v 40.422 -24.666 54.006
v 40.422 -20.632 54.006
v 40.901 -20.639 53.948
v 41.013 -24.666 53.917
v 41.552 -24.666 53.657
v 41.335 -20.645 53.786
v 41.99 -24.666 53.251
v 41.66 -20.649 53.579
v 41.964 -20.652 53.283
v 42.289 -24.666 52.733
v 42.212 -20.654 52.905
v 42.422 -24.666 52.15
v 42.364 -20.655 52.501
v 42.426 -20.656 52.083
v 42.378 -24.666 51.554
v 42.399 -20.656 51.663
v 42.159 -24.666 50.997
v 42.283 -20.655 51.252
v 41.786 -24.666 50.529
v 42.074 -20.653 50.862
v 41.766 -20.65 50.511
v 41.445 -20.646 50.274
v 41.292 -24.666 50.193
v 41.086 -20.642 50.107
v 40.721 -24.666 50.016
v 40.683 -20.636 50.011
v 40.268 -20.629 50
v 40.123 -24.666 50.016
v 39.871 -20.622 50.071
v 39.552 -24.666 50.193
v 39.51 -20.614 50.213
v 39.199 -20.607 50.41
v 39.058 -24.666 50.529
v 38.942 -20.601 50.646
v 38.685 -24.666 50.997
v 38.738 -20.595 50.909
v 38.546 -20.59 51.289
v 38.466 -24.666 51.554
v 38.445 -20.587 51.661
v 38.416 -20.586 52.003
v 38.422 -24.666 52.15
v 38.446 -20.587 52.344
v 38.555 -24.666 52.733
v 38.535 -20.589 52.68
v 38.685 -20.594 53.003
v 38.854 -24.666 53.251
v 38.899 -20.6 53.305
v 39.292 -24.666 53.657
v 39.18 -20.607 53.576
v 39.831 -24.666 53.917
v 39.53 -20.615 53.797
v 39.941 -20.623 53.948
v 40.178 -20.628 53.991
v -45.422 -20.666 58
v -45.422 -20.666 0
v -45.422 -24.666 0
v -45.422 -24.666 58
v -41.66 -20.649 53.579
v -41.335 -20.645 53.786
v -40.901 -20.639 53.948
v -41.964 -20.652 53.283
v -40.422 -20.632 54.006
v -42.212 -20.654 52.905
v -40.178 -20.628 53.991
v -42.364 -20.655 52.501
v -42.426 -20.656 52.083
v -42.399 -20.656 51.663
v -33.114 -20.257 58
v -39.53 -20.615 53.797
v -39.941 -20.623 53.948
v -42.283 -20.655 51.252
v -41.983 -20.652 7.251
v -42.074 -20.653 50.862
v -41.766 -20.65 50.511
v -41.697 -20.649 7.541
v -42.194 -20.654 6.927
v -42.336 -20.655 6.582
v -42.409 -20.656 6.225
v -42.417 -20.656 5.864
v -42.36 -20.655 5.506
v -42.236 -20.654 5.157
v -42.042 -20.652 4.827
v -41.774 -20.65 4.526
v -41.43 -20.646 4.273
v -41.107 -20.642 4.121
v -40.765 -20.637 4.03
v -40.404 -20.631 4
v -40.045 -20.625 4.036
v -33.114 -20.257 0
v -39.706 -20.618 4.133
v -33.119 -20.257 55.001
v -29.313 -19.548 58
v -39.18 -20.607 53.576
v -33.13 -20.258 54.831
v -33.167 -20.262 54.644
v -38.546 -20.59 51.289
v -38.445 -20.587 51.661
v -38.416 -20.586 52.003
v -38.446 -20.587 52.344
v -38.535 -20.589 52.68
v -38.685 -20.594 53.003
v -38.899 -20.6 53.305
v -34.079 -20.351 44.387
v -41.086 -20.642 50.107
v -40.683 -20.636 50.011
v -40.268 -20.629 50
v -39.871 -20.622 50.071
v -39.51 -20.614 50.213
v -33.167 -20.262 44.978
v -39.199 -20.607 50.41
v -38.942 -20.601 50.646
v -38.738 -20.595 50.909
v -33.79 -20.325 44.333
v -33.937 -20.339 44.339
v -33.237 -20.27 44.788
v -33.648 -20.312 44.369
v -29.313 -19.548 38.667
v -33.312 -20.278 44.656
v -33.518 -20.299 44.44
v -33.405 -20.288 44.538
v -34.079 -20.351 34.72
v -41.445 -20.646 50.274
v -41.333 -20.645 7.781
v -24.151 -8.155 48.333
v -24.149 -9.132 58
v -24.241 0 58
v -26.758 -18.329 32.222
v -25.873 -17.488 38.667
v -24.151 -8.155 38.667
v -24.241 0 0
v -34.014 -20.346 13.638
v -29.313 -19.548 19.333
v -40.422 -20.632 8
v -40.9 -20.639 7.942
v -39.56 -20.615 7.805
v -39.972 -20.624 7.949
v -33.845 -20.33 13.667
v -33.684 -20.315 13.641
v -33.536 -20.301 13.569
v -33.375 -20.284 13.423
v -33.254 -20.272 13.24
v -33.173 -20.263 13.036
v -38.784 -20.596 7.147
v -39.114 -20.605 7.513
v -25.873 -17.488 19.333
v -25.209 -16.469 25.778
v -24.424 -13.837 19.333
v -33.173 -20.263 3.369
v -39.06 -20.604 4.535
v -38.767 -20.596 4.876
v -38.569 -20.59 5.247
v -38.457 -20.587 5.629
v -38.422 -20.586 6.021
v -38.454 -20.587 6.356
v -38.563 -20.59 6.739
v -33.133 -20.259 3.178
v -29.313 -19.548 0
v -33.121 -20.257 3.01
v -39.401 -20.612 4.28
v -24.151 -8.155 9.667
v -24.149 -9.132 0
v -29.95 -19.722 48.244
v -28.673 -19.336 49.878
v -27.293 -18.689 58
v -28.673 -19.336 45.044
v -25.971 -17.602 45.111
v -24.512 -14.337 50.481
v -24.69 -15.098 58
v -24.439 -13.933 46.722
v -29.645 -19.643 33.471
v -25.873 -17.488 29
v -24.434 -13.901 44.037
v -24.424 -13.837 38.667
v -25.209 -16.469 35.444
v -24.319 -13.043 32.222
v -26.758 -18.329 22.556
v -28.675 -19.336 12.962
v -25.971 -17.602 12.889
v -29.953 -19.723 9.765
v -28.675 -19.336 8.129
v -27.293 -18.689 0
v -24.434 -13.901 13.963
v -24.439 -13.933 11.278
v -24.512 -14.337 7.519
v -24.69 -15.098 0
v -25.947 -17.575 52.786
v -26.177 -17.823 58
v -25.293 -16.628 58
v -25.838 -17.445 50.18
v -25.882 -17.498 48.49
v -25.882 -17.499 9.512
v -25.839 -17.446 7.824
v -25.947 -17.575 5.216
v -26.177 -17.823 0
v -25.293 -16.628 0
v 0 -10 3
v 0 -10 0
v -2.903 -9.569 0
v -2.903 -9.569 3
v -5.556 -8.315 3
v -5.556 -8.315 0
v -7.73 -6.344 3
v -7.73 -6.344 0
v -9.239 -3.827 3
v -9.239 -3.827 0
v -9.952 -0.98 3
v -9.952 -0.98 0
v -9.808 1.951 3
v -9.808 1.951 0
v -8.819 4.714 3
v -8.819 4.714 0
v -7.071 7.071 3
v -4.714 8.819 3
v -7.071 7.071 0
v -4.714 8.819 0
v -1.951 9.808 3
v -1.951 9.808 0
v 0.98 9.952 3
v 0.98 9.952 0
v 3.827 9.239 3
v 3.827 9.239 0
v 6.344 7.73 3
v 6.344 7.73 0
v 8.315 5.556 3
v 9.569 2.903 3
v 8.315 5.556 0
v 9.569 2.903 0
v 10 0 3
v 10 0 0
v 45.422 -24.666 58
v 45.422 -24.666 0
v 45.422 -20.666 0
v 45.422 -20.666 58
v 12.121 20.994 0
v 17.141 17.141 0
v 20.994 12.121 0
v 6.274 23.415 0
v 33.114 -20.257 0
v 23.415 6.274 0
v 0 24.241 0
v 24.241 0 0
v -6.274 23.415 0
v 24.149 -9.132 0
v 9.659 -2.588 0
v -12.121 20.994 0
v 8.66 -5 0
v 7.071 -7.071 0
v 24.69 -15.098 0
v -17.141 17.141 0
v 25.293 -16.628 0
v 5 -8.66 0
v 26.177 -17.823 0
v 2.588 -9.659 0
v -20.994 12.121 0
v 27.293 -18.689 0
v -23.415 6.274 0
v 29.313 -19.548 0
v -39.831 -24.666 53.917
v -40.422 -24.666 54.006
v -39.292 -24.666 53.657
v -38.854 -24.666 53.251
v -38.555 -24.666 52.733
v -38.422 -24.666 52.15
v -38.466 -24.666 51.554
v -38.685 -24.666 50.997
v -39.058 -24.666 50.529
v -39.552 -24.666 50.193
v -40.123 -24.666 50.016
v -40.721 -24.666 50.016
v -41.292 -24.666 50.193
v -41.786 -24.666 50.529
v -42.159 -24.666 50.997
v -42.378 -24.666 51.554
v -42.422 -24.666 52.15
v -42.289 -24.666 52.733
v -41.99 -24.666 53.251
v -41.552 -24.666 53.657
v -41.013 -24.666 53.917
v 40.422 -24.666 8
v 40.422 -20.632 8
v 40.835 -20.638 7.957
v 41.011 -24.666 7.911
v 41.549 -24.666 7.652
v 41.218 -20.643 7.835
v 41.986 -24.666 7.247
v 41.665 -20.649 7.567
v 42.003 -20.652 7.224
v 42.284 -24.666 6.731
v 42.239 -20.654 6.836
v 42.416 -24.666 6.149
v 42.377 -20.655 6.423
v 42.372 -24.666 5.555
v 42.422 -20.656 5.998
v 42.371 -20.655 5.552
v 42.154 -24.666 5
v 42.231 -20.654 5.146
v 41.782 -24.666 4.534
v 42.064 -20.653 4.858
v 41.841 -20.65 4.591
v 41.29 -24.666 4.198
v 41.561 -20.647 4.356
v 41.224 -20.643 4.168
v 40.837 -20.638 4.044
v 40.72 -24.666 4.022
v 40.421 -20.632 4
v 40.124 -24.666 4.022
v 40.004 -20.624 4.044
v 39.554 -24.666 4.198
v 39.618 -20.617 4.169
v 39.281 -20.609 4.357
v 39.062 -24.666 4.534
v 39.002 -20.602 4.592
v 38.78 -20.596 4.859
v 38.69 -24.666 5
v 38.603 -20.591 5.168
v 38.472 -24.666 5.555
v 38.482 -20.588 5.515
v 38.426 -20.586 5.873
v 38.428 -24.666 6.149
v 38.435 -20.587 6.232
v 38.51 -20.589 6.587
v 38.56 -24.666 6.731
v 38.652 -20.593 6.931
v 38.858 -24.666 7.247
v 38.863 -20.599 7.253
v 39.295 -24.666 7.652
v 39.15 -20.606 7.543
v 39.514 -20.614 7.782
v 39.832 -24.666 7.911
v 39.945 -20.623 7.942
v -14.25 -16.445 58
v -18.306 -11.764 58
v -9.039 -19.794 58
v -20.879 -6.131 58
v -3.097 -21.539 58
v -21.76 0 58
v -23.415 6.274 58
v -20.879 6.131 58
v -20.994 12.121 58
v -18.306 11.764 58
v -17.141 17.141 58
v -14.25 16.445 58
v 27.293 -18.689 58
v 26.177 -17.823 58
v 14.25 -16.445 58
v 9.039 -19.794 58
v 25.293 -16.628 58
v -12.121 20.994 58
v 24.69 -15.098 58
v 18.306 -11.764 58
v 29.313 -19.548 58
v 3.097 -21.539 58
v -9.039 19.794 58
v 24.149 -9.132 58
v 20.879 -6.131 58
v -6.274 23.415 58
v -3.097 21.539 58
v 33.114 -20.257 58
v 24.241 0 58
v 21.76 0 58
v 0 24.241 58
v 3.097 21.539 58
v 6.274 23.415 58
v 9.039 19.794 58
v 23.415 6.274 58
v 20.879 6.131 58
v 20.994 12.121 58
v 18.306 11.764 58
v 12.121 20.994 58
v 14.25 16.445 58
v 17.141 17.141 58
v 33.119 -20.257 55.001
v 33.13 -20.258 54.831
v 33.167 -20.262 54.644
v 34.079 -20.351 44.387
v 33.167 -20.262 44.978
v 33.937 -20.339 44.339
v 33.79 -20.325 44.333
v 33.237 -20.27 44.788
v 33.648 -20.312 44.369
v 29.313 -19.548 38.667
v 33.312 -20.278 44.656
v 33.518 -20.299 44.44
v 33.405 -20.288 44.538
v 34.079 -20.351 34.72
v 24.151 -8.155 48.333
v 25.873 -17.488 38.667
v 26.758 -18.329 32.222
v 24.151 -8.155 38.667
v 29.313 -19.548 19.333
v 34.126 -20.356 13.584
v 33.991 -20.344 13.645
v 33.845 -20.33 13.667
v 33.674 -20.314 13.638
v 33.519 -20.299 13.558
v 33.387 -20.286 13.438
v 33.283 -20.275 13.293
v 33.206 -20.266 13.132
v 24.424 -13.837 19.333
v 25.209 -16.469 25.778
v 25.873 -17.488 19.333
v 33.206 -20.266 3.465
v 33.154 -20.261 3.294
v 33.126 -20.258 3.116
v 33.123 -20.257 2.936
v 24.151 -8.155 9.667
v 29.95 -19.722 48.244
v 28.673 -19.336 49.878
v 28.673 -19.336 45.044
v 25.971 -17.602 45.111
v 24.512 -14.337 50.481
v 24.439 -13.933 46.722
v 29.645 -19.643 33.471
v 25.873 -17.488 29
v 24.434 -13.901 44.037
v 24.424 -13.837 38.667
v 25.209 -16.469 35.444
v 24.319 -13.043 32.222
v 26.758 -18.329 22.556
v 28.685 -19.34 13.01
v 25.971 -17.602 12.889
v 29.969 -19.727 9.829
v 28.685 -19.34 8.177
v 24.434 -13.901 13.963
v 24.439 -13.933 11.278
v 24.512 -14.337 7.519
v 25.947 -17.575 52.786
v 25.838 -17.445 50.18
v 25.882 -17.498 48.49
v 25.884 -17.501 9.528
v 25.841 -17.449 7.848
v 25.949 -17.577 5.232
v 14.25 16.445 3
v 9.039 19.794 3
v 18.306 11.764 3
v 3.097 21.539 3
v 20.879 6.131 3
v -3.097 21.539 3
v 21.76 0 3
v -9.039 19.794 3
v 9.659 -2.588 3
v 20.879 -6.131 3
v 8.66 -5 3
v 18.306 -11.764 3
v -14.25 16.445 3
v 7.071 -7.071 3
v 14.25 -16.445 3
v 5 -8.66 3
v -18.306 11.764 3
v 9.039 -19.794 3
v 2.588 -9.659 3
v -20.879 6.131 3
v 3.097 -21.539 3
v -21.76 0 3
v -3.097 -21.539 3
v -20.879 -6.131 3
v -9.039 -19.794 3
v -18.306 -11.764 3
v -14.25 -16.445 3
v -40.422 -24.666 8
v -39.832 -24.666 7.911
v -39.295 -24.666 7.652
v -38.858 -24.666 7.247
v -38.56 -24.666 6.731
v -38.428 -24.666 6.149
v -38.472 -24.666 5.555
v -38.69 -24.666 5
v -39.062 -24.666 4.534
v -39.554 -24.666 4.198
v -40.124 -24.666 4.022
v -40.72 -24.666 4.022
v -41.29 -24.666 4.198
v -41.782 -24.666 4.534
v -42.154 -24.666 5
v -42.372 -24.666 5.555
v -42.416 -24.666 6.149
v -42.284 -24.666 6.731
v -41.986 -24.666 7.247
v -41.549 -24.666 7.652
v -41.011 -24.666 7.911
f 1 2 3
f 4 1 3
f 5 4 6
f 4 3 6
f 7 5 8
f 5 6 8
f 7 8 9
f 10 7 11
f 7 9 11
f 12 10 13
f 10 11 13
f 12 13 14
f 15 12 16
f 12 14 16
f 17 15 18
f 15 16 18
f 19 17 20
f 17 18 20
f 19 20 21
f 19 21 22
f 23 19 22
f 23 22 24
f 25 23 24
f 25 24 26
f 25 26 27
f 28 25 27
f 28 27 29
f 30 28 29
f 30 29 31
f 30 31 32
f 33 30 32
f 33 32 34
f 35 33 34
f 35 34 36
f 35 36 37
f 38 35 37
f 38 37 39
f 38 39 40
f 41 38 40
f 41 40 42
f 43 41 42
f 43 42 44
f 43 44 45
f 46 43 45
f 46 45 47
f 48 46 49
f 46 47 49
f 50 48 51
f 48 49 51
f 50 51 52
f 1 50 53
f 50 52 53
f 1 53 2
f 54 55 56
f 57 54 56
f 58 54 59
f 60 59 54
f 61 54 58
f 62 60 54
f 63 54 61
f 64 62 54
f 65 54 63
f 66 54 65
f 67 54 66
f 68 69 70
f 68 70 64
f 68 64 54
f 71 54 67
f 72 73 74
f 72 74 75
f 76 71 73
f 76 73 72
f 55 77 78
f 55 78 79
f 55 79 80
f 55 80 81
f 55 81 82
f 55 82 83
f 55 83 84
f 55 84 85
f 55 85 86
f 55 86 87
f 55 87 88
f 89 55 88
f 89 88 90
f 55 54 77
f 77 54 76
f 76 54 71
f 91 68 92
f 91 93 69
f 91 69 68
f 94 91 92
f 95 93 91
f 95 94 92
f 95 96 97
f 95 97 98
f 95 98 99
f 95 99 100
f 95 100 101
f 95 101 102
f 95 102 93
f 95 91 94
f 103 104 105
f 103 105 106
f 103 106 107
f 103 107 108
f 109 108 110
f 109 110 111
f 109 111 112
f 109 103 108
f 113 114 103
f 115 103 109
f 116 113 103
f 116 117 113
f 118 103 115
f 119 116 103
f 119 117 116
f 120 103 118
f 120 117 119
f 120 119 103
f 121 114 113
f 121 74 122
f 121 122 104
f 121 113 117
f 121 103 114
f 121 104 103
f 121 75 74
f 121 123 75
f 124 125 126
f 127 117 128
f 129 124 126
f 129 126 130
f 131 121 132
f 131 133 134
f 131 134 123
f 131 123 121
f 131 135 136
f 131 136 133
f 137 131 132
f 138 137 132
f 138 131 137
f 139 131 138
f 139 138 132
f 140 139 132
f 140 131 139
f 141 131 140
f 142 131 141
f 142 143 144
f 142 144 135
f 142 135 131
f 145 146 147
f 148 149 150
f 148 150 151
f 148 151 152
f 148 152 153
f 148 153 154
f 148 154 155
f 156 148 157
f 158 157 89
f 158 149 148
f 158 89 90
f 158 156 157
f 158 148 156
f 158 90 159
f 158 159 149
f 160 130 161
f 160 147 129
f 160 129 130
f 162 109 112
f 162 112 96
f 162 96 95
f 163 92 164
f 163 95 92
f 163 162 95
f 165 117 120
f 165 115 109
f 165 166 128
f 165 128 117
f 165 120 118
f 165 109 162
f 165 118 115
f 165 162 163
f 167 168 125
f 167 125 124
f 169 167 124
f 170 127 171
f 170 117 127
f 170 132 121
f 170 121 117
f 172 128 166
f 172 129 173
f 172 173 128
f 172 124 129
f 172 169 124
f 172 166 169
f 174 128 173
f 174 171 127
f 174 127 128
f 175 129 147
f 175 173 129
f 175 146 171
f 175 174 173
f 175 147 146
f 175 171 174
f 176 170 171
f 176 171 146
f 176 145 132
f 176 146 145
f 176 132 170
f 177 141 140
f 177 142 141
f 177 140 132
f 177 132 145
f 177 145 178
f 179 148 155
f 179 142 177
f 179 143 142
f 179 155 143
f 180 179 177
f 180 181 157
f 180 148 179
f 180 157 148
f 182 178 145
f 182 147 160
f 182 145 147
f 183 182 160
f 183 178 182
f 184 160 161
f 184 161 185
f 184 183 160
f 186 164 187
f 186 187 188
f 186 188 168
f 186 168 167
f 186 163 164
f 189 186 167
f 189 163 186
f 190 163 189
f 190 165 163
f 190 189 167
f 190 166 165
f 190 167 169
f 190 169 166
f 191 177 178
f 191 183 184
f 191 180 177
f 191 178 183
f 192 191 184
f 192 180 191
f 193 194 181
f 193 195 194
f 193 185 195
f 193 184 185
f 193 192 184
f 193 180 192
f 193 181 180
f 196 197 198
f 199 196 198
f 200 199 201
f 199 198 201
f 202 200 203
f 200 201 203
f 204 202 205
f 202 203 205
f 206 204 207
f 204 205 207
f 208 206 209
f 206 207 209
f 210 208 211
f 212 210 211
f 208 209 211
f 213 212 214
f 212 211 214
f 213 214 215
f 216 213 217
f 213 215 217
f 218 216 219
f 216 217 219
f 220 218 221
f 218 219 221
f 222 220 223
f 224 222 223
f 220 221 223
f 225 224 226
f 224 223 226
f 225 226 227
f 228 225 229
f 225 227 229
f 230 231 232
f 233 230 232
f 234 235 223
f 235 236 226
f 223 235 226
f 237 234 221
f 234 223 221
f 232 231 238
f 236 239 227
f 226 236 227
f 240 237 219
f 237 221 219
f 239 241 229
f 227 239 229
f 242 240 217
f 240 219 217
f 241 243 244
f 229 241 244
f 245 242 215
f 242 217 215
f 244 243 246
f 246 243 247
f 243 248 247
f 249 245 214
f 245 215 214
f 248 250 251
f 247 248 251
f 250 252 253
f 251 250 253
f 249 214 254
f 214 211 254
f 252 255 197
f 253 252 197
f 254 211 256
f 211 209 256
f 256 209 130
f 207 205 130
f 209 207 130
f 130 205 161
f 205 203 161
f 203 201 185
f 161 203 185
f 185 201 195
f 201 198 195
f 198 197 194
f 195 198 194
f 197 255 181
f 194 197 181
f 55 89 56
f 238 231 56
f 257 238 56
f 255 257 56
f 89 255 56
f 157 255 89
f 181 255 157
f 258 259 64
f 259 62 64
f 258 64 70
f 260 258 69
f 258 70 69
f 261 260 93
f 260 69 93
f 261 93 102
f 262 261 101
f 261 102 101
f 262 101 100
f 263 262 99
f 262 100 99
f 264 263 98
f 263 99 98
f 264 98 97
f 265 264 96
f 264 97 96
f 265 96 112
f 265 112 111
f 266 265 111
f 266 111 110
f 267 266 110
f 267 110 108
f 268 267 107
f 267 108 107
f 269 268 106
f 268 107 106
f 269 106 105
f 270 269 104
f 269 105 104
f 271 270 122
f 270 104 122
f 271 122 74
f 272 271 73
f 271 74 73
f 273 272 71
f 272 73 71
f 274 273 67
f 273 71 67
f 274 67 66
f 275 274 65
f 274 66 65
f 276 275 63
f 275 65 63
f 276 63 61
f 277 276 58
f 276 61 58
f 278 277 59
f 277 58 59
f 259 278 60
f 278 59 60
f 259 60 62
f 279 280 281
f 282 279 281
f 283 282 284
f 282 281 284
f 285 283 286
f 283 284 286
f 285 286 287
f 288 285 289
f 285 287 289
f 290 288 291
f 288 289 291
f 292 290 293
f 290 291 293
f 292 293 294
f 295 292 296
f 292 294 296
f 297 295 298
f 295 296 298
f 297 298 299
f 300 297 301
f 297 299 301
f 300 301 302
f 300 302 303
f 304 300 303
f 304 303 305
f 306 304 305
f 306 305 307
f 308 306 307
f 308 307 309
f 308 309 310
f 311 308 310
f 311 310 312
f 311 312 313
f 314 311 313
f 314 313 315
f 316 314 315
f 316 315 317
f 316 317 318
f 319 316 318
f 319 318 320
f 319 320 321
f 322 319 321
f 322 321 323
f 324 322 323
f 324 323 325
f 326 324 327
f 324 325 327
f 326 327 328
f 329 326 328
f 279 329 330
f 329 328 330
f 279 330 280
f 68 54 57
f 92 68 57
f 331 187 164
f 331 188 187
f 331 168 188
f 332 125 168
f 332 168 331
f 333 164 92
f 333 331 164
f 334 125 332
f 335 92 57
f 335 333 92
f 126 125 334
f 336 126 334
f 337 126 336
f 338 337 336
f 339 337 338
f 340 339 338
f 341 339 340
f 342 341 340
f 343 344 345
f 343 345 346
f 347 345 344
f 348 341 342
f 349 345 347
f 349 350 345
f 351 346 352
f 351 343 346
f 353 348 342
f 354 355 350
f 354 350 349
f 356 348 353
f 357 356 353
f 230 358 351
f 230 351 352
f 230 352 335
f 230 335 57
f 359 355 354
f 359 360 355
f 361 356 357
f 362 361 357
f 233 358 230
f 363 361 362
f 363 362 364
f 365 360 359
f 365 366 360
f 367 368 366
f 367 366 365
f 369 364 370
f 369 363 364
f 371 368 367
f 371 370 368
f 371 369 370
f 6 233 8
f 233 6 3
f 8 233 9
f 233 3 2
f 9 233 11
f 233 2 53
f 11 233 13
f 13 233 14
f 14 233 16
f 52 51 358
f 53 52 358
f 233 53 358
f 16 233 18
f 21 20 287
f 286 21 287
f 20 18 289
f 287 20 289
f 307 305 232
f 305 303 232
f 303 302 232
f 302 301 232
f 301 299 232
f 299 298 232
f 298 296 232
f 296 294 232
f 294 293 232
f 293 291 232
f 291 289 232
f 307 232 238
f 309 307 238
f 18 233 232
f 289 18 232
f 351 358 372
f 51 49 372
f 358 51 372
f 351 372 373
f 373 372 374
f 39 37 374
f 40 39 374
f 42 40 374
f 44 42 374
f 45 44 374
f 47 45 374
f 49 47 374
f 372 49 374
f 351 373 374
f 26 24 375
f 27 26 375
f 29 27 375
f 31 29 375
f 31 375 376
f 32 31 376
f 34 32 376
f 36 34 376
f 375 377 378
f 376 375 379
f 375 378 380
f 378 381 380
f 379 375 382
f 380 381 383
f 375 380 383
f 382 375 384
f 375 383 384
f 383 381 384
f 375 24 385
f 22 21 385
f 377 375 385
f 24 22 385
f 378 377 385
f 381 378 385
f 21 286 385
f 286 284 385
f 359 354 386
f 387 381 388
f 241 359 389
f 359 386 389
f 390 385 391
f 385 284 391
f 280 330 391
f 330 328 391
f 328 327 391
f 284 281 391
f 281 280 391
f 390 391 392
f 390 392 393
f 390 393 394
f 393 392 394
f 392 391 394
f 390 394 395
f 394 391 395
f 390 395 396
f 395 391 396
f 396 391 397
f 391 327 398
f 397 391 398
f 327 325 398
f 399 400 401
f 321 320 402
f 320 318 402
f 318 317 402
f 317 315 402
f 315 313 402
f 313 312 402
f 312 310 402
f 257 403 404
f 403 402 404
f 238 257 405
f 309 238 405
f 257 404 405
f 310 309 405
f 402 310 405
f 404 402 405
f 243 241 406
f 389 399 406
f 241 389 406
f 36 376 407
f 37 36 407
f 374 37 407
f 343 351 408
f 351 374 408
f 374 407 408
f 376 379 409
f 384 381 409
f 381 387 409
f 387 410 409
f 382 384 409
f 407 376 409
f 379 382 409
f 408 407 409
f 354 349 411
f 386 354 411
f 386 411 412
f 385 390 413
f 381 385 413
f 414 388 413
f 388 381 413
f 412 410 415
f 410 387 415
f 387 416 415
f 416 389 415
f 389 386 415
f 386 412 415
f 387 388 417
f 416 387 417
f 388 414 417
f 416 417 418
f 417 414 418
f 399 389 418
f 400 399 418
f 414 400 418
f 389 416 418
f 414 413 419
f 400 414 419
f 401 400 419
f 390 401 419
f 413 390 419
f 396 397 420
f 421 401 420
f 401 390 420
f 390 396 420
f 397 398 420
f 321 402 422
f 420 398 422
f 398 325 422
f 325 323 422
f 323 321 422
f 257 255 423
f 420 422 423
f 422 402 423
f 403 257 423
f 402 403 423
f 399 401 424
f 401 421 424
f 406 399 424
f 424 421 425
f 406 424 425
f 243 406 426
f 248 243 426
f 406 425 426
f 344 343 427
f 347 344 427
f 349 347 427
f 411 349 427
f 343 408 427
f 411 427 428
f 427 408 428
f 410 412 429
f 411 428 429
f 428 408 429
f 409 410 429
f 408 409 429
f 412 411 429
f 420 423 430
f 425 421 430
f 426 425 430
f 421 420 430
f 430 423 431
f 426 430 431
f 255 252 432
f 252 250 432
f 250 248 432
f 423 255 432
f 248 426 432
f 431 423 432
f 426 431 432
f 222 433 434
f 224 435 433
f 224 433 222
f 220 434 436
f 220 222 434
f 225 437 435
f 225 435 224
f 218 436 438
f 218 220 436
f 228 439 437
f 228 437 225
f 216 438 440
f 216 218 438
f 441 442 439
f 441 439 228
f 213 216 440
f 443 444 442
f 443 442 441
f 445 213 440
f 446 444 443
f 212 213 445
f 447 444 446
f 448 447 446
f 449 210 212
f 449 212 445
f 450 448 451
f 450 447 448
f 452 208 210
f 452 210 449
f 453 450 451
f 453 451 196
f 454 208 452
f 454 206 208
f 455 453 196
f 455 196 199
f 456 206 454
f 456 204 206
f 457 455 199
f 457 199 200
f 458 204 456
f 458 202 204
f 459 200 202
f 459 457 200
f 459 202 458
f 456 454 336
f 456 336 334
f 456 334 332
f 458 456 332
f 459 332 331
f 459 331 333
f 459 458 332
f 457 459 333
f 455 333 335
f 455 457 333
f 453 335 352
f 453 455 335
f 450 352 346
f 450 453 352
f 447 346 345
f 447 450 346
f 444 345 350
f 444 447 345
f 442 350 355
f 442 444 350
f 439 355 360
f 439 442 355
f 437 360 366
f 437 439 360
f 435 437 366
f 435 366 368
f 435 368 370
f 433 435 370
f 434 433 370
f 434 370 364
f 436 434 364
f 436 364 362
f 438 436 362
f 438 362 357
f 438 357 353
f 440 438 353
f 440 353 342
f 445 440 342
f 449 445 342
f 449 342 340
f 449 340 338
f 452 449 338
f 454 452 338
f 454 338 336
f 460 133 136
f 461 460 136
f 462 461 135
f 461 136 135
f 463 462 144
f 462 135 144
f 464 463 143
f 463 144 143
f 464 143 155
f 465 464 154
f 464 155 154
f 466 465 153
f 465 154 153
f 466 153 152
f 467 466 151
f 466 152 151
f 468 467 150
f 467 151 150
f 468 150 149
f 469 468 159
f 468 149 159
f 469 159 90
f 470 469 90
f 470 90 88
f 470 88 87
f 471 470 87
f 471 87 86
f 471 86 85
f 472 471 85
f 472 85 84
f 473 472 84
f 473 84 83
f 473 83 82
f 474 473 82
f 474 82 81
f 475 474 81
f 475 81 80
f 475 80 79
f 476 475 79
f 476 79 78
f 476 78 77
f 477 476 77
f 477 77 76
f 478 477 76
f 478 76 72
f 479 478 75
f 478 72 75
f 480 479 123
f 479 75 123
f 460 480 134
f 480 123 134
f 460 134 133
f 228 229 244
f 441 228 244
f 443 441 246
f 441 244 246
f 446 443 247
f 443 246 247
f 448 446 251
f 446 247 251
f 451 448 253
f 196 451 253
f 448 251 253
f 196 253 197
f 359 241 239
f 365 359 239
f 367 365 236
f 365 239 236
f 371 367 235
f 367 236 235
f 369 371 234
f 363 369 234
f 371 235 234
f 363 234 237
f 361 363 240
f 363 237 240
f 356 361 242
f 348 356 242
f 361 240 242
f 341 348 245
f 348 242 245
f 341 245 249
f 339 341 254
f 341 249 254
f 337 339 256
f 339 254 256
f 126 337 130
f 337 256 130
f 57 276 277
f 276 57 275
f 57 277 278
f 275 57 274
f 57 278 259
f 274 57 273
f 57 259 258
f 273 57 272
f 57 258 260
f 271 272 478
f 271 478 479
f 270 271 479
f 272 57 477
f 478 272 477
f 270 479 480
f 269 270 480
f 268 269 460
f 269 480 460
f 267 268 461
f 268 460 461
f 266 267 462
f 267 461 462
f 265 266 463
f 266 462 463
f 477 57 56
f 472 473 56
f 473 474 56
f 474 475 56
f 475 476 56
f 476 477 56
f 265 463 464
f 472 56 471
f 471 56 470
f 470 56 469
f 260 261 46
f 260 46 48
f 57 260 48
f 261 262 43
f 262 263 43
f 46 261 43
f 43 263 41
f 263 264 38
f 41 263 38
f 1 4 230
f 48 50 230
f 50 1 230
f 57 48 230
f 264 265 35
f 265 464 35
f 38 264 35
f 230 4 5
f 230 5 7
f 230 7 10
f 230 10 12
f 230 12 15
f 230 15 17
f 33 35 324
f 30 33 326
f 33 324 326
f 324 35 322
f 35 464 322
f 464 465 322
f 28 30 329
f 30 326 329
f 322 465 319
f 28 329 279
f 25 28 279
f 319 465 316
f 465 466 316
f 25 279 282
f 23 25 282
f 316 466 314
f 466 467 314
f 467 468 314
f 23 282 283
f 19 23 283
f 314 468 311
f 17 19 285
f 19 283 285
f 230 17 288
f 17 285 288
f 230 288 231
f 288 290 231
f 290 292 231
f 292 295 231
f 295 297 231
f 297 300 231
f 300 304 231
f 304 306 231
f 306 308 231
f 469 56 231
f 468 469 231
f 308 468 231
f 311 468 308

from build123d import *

# Parameters (mm, degrees)
SKETCH1_R           = 21.76
BOSS_EXTRUDE1_DEPTH = 58
SKETCH1_4_R         = 21.76
BOSS_EXTRUDE2_DEPTH = 3
SKETCH2_R           = 2
CUT_EXTRUDE2_DEPTH  = 30
SKETCH2_3_R         = 2.006014876
CUT_EXTRUDE3_DEPTH  = 30


with BuildPart() as part:
    # Sketch1 → Boss-Extrude1 (new body)
    with BuildSketch(Plane.XY):
        with BuildLine():
            Line((-45.421940828, -20.666245921), (-45.421940828, -24.666245921))
            Line((-45.421940828, -24.666245921), (45.421940828, -24.666245921))
            Line((45.421940828, -24.666245921), (45.421940828, -20.666245921))
            add(Edge.make_bspline(
                [(45.421940828, -20.666245921), (21.532203305, -20.666245921), (24.241475666, -19.078845964), (24.241475666, 0)],
                knots=[0, 0, 0, 0, 1, 1, 1, 1], degree=3))
            ThreePointArc((24.241475666, 0), (0, 24.241475666), (-24.241475666, 0))
            add(Edge.make_bspline(
                [(-45.421940828, -20.666245921), (-21.532203305, -20.666245921), (-24.241475666, -19.078845964), (-24.241475666, 0)],
                knots=[0, 0, 0, 0, 1, 1, 1, 1], degree=3))
        make_face()
        Circle(SKETCH1_R, mode=Mode.SUBTRACT)
    extrude(amount=BOSS_EXTRUDE1_DEPTH)

    # Sketch1<4> → Boss-Extrude2 (add)
    with BuildSketch(Plane.XY):
        Circle(SKETCH1_4_R)
        with BuildLine():
            ThreePointArc((0, -10), (-7.071067812, 7.071067812), (10, 0))
            ThreePointArc((10, 0), (7.071067812, -7.071067812), (0, -10))
        make_face(mode=Mode.SUBTRACT)
    extrude(amount=BOSS_EXTRUDE2_DEPTH)

    # Sketch2 → Cut-Extrude2 (cut)
    with BuildSketch(Plane(origin=(0, 0, 0), x_dir=(1, 0, 0), z_dir=(0, 1, 0))):
        with Locations((-40.421940828, -6)):
            Circle(SKETCH2_R)
        with Locations((40.421940828, -6)):
            Circle(SKETCH2_R)
    extrude(amount=-CUT_EXTRUDE2_DEPTH, mode=Mode.SUBTRACT)

    # Sketch2<3> → Cut-Extrude3 (cut)
    with BuildSketch(Plane(origin=(0, 0, 0), x_dir=(1, 0, 0), z_dir=(0, 1, 0))):
        with Locations((-40.421940828, -52)):
            Circle(SKETCH2_3_R)
        with Locations((40.421940828, -52)):
            Circle(SKETCH2_3_R)
    extrude(amount=-CUT_EXTRUDE3_DEPTH, mode=Mode.SUBTRACT)


solid = part.part
